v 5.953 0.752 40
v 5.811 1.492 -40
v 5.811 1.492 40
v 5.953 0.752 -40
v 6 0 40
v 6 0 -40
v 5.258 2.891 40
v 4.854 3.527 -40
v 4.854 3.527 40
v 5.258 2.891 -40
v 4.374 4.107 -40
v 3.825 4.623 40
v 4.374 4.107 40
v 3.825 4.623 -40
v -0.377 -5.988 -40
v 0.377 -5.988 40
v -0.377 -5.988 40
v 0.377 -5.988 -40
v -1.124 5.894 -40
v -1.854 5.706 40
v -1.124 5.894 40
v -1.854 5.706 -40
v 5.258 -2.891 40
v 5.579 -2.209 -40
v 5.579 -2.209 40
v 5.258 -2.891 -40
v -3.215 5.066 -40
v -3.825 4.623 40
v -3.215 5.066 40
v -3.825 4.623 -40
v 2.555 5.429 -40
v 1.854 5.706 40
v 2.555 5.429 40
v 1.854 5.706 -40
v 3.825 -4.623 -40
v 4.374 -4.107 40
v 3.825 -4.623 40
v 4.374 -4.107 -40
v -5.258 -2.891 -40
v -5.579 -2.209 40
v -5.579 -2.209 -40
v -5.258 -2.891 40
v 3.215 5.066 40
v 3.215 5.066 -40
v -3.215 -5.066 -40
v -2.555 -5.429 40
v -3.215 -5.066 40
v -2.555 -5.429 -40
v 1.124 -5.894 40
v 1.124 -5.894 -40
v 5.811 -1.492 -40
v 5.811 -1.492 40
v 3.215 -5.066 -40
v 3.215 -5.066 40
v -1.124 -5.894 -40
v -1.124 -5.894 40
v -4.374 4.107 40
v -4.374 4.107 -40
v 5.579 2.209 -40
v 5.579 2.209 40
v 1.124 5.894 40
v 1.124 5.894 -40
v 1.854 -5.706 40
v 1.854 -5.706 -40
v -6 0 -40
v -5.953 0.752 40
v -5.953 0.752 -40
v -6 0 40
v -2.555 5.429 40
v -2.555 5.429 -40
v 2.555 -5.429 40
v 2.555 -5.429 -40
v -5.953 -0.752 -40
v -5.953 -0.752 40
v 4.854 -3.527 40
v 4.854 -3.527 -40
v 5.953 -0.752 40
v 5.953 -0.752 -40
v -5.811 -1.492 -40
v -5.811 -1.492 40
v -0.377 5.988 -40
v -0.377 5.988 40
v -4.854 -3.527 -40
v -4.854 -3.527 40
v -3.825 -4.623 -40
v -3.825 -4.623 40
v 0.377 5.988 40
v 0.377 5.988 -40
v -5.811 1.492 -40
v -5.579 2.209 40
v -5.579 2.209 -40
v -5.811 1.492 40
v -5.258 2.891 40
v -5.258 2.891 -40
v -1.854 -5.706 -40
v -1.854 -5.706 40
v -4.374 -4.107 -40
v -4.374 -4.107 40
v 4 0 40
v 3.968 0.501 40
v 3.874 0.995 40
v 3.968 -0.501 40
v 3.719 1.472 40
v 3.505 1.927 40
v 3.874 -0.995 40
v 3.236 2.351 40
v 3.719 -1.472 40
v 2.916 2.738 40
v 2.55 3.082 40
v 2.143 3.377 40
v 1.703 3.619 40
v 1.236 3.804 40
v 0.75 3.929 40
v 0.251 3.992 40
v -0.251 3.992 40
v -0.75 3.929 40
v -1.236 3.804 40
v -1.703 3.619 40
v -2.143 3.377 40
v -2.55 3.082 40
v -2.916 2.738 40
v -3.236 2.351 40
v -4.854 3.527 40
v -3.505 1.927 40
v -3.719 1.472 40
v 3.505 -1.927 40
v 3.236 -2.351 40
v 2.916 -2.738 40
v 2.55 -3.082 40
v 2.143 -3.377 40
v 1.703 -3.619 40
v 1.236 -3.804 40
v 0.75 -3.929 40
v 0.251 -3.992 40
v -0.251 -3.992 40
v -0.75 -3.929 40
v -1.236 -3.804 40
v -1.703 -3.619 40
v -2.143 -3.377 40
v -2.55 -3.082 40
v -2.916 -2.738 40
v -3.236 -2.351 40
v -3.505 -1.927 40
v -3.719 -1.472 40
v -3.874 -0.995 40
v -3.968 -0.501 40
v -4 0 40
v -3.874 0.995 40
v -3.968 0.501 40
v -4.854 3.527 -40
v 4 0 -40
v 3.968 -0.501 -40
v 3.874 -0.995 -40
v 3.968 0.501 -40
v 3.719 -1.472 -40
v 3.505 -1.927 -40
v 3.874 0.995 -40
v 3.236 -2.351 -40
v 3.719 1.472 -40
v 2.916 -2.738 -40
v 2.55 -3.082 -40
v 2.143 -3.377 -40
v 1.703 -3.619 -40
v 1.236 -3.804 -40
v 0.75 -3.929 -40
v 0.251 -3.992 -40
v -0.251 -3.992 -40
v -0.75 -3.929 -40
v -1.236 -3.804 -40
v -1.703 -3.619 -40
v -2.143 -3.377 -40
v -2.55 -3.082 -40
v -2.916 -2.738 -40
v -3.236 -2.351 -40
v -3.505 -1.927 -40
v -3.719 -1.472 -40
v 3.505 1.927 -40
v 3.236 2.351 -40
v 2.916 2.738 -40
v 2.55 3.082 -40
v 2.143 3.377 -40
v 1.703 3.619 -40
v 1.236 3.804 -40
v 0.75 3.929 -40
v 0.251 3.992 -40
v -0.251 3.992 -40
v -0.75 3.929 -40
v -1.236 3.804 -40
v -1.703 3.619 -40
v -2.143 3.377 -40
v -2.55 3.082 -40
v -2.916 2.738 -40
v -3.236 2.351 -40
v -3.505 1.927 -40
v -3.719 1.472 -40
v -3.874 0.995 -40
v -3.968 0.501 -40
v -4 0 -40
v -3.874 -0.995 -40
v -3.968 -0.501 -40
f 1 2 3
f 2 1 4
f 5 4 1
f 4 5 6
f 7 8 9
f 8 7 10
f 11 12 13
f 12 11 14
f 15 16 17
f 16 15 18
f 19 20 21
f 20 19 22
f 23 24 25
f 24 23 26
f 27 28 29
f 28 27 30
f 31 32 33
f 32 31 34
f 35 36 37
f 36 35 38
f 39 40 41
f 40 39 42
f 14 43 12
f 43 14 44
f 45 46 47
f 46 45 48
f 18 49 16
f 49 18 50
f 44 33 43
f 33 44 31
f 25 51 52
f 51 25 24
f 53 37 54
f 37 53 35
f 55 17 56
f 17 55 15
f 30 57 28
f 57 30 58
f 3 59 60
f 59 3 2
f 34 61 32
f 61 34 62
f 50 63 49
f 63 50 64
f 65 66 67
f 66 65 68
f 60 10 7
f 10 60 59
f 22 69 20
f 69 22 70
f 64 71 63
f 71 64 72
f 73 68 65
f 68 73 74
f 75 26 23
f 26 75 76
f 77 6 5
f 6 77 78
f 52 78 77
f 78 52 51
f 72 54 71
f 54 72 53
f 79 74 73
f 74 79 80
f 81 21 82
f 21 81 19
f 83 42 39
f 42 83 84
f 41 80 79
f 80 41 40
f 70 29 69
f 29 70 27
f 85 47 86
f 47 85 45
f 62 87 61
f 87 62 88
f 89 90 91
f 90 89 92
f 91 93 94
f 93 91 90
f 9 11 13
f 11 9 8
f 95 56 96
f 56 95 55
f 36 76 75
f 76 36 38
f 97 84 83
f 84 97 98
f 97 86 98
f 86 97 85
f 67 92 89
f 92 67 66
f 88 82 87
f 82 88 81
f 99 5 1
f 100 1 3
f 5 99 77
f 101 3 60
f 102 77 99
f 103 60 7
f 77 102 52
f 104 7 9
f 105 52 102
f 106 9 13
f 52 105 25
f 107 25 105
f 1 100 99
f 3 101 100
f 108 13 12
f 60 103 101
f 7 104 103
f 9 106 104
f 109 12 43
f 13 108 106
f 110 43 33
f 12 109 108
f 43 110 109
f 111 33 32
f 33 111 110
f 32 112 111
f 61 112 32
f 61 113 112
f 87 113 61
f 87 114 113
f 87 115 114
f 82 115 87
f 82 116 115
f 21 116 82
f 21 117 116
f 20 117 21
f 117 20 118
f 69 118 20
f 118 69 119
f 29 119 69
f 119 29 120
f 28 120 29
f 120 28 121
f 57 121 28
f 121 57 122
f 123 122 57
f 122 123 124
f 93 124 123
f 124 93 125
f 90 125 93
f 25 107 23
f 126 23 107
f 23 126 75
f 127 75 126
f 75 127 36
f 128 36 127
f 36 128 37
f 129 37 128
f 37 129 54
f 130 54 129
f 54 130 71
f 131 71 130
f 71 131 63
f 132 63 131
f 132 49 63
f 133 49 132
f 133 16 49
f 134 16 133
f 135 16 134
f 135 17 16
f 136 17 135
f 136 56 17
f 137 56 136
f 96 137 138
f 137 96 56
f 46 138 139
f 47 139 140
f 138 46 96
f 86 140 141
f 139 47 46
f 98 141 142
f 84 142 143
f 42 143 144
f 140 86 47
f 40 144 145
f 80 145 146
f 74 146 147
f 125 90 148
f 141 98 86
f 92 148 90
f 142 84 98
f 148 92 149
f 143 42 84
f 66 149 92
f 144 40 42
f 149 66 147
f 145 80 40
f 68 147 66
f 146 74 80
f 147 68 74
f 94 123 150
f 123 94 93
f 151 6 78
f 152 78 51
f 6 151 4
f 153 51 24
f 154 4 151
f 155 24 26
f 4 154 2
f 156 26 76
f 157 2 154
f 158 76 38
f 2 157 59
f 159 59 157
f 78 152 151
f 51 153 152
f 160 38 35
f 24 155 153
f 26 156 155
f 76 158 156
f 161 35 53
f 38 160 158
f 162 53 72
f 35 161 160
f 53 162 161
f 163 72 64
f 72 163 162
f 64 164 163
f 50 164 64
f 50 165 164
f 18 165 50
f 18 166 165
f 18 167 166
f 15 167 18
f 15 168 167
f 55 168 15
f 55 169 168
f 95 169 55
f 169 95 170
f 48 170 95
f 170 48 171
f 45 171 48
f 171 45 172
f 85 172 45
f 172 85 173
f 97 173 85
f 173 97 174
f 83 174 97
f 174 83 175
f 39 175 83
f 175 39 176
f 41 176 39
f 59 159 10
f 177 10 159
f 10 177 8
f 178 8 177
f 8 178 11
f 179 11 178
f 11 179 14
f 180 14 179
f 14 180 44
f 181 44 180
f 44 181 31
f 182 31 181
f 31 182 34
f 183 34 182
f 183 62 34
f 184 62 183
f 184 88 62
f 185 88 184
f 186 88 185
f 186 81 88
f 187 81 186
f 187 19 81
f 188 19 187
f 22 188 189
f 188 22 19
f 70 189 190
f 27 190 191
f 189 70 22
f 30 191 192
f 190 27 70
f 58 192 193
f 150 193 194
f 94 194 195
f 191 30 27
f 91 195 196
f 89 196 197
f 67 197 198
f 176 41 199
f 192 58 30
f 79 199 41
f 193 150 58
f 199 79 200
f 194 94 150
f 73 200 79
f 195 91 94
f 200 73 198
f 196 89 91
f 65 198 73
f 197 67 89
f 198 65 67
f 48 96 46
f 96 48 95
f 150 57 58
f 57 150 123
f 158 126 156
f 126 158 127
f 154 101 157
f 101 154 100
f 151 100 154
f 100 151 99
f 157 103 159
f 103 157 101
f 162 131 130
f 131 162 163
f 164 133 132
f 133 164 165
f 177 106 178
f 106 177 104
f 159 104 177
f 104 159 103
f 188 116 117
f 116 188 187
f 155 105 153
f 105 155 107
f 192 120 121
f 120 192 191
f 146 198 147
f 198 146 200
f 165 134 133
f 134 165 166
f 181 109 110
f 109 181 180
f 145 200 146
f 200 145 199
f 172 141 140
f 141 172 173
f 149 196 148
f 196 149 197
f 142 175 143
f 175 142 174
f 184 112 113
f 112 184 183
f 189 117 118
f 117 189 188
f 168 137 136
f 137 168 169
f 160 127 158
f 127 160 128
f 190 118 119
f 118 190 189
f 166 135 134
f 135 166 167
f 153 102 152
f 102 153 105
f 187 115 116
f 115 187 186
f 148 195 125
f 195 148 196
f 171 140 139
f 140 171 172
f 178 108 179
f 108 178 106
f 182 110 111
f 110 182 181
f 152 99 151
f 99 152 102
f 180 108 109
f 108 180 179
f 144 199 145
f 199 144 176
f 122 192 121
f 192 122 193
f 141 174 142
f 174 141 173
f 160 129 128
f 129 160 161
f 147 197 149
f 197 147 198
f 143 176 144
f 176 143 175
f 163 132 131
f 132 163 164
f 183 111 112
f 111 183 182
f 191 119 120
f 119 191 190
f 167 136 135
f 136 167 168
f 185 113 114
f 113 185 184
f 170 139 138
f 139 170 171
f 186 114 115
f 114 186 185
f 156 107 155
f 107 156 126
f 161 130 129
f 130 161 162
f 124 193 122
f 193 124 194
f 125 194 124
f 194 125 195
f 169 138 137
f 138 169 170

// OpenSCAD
$fn = 50;


difference() {
	union() {
		translate(v = [0, 0, -40.0000000000]) {
			cylinder(h = 80, r = 6.0000000000);
		}
	}
	union() {
		translate(v = [0, 0, -100.0000000000]) {
			cylinder(h = 200, r = 4.0000000000);
		}
	}
}
